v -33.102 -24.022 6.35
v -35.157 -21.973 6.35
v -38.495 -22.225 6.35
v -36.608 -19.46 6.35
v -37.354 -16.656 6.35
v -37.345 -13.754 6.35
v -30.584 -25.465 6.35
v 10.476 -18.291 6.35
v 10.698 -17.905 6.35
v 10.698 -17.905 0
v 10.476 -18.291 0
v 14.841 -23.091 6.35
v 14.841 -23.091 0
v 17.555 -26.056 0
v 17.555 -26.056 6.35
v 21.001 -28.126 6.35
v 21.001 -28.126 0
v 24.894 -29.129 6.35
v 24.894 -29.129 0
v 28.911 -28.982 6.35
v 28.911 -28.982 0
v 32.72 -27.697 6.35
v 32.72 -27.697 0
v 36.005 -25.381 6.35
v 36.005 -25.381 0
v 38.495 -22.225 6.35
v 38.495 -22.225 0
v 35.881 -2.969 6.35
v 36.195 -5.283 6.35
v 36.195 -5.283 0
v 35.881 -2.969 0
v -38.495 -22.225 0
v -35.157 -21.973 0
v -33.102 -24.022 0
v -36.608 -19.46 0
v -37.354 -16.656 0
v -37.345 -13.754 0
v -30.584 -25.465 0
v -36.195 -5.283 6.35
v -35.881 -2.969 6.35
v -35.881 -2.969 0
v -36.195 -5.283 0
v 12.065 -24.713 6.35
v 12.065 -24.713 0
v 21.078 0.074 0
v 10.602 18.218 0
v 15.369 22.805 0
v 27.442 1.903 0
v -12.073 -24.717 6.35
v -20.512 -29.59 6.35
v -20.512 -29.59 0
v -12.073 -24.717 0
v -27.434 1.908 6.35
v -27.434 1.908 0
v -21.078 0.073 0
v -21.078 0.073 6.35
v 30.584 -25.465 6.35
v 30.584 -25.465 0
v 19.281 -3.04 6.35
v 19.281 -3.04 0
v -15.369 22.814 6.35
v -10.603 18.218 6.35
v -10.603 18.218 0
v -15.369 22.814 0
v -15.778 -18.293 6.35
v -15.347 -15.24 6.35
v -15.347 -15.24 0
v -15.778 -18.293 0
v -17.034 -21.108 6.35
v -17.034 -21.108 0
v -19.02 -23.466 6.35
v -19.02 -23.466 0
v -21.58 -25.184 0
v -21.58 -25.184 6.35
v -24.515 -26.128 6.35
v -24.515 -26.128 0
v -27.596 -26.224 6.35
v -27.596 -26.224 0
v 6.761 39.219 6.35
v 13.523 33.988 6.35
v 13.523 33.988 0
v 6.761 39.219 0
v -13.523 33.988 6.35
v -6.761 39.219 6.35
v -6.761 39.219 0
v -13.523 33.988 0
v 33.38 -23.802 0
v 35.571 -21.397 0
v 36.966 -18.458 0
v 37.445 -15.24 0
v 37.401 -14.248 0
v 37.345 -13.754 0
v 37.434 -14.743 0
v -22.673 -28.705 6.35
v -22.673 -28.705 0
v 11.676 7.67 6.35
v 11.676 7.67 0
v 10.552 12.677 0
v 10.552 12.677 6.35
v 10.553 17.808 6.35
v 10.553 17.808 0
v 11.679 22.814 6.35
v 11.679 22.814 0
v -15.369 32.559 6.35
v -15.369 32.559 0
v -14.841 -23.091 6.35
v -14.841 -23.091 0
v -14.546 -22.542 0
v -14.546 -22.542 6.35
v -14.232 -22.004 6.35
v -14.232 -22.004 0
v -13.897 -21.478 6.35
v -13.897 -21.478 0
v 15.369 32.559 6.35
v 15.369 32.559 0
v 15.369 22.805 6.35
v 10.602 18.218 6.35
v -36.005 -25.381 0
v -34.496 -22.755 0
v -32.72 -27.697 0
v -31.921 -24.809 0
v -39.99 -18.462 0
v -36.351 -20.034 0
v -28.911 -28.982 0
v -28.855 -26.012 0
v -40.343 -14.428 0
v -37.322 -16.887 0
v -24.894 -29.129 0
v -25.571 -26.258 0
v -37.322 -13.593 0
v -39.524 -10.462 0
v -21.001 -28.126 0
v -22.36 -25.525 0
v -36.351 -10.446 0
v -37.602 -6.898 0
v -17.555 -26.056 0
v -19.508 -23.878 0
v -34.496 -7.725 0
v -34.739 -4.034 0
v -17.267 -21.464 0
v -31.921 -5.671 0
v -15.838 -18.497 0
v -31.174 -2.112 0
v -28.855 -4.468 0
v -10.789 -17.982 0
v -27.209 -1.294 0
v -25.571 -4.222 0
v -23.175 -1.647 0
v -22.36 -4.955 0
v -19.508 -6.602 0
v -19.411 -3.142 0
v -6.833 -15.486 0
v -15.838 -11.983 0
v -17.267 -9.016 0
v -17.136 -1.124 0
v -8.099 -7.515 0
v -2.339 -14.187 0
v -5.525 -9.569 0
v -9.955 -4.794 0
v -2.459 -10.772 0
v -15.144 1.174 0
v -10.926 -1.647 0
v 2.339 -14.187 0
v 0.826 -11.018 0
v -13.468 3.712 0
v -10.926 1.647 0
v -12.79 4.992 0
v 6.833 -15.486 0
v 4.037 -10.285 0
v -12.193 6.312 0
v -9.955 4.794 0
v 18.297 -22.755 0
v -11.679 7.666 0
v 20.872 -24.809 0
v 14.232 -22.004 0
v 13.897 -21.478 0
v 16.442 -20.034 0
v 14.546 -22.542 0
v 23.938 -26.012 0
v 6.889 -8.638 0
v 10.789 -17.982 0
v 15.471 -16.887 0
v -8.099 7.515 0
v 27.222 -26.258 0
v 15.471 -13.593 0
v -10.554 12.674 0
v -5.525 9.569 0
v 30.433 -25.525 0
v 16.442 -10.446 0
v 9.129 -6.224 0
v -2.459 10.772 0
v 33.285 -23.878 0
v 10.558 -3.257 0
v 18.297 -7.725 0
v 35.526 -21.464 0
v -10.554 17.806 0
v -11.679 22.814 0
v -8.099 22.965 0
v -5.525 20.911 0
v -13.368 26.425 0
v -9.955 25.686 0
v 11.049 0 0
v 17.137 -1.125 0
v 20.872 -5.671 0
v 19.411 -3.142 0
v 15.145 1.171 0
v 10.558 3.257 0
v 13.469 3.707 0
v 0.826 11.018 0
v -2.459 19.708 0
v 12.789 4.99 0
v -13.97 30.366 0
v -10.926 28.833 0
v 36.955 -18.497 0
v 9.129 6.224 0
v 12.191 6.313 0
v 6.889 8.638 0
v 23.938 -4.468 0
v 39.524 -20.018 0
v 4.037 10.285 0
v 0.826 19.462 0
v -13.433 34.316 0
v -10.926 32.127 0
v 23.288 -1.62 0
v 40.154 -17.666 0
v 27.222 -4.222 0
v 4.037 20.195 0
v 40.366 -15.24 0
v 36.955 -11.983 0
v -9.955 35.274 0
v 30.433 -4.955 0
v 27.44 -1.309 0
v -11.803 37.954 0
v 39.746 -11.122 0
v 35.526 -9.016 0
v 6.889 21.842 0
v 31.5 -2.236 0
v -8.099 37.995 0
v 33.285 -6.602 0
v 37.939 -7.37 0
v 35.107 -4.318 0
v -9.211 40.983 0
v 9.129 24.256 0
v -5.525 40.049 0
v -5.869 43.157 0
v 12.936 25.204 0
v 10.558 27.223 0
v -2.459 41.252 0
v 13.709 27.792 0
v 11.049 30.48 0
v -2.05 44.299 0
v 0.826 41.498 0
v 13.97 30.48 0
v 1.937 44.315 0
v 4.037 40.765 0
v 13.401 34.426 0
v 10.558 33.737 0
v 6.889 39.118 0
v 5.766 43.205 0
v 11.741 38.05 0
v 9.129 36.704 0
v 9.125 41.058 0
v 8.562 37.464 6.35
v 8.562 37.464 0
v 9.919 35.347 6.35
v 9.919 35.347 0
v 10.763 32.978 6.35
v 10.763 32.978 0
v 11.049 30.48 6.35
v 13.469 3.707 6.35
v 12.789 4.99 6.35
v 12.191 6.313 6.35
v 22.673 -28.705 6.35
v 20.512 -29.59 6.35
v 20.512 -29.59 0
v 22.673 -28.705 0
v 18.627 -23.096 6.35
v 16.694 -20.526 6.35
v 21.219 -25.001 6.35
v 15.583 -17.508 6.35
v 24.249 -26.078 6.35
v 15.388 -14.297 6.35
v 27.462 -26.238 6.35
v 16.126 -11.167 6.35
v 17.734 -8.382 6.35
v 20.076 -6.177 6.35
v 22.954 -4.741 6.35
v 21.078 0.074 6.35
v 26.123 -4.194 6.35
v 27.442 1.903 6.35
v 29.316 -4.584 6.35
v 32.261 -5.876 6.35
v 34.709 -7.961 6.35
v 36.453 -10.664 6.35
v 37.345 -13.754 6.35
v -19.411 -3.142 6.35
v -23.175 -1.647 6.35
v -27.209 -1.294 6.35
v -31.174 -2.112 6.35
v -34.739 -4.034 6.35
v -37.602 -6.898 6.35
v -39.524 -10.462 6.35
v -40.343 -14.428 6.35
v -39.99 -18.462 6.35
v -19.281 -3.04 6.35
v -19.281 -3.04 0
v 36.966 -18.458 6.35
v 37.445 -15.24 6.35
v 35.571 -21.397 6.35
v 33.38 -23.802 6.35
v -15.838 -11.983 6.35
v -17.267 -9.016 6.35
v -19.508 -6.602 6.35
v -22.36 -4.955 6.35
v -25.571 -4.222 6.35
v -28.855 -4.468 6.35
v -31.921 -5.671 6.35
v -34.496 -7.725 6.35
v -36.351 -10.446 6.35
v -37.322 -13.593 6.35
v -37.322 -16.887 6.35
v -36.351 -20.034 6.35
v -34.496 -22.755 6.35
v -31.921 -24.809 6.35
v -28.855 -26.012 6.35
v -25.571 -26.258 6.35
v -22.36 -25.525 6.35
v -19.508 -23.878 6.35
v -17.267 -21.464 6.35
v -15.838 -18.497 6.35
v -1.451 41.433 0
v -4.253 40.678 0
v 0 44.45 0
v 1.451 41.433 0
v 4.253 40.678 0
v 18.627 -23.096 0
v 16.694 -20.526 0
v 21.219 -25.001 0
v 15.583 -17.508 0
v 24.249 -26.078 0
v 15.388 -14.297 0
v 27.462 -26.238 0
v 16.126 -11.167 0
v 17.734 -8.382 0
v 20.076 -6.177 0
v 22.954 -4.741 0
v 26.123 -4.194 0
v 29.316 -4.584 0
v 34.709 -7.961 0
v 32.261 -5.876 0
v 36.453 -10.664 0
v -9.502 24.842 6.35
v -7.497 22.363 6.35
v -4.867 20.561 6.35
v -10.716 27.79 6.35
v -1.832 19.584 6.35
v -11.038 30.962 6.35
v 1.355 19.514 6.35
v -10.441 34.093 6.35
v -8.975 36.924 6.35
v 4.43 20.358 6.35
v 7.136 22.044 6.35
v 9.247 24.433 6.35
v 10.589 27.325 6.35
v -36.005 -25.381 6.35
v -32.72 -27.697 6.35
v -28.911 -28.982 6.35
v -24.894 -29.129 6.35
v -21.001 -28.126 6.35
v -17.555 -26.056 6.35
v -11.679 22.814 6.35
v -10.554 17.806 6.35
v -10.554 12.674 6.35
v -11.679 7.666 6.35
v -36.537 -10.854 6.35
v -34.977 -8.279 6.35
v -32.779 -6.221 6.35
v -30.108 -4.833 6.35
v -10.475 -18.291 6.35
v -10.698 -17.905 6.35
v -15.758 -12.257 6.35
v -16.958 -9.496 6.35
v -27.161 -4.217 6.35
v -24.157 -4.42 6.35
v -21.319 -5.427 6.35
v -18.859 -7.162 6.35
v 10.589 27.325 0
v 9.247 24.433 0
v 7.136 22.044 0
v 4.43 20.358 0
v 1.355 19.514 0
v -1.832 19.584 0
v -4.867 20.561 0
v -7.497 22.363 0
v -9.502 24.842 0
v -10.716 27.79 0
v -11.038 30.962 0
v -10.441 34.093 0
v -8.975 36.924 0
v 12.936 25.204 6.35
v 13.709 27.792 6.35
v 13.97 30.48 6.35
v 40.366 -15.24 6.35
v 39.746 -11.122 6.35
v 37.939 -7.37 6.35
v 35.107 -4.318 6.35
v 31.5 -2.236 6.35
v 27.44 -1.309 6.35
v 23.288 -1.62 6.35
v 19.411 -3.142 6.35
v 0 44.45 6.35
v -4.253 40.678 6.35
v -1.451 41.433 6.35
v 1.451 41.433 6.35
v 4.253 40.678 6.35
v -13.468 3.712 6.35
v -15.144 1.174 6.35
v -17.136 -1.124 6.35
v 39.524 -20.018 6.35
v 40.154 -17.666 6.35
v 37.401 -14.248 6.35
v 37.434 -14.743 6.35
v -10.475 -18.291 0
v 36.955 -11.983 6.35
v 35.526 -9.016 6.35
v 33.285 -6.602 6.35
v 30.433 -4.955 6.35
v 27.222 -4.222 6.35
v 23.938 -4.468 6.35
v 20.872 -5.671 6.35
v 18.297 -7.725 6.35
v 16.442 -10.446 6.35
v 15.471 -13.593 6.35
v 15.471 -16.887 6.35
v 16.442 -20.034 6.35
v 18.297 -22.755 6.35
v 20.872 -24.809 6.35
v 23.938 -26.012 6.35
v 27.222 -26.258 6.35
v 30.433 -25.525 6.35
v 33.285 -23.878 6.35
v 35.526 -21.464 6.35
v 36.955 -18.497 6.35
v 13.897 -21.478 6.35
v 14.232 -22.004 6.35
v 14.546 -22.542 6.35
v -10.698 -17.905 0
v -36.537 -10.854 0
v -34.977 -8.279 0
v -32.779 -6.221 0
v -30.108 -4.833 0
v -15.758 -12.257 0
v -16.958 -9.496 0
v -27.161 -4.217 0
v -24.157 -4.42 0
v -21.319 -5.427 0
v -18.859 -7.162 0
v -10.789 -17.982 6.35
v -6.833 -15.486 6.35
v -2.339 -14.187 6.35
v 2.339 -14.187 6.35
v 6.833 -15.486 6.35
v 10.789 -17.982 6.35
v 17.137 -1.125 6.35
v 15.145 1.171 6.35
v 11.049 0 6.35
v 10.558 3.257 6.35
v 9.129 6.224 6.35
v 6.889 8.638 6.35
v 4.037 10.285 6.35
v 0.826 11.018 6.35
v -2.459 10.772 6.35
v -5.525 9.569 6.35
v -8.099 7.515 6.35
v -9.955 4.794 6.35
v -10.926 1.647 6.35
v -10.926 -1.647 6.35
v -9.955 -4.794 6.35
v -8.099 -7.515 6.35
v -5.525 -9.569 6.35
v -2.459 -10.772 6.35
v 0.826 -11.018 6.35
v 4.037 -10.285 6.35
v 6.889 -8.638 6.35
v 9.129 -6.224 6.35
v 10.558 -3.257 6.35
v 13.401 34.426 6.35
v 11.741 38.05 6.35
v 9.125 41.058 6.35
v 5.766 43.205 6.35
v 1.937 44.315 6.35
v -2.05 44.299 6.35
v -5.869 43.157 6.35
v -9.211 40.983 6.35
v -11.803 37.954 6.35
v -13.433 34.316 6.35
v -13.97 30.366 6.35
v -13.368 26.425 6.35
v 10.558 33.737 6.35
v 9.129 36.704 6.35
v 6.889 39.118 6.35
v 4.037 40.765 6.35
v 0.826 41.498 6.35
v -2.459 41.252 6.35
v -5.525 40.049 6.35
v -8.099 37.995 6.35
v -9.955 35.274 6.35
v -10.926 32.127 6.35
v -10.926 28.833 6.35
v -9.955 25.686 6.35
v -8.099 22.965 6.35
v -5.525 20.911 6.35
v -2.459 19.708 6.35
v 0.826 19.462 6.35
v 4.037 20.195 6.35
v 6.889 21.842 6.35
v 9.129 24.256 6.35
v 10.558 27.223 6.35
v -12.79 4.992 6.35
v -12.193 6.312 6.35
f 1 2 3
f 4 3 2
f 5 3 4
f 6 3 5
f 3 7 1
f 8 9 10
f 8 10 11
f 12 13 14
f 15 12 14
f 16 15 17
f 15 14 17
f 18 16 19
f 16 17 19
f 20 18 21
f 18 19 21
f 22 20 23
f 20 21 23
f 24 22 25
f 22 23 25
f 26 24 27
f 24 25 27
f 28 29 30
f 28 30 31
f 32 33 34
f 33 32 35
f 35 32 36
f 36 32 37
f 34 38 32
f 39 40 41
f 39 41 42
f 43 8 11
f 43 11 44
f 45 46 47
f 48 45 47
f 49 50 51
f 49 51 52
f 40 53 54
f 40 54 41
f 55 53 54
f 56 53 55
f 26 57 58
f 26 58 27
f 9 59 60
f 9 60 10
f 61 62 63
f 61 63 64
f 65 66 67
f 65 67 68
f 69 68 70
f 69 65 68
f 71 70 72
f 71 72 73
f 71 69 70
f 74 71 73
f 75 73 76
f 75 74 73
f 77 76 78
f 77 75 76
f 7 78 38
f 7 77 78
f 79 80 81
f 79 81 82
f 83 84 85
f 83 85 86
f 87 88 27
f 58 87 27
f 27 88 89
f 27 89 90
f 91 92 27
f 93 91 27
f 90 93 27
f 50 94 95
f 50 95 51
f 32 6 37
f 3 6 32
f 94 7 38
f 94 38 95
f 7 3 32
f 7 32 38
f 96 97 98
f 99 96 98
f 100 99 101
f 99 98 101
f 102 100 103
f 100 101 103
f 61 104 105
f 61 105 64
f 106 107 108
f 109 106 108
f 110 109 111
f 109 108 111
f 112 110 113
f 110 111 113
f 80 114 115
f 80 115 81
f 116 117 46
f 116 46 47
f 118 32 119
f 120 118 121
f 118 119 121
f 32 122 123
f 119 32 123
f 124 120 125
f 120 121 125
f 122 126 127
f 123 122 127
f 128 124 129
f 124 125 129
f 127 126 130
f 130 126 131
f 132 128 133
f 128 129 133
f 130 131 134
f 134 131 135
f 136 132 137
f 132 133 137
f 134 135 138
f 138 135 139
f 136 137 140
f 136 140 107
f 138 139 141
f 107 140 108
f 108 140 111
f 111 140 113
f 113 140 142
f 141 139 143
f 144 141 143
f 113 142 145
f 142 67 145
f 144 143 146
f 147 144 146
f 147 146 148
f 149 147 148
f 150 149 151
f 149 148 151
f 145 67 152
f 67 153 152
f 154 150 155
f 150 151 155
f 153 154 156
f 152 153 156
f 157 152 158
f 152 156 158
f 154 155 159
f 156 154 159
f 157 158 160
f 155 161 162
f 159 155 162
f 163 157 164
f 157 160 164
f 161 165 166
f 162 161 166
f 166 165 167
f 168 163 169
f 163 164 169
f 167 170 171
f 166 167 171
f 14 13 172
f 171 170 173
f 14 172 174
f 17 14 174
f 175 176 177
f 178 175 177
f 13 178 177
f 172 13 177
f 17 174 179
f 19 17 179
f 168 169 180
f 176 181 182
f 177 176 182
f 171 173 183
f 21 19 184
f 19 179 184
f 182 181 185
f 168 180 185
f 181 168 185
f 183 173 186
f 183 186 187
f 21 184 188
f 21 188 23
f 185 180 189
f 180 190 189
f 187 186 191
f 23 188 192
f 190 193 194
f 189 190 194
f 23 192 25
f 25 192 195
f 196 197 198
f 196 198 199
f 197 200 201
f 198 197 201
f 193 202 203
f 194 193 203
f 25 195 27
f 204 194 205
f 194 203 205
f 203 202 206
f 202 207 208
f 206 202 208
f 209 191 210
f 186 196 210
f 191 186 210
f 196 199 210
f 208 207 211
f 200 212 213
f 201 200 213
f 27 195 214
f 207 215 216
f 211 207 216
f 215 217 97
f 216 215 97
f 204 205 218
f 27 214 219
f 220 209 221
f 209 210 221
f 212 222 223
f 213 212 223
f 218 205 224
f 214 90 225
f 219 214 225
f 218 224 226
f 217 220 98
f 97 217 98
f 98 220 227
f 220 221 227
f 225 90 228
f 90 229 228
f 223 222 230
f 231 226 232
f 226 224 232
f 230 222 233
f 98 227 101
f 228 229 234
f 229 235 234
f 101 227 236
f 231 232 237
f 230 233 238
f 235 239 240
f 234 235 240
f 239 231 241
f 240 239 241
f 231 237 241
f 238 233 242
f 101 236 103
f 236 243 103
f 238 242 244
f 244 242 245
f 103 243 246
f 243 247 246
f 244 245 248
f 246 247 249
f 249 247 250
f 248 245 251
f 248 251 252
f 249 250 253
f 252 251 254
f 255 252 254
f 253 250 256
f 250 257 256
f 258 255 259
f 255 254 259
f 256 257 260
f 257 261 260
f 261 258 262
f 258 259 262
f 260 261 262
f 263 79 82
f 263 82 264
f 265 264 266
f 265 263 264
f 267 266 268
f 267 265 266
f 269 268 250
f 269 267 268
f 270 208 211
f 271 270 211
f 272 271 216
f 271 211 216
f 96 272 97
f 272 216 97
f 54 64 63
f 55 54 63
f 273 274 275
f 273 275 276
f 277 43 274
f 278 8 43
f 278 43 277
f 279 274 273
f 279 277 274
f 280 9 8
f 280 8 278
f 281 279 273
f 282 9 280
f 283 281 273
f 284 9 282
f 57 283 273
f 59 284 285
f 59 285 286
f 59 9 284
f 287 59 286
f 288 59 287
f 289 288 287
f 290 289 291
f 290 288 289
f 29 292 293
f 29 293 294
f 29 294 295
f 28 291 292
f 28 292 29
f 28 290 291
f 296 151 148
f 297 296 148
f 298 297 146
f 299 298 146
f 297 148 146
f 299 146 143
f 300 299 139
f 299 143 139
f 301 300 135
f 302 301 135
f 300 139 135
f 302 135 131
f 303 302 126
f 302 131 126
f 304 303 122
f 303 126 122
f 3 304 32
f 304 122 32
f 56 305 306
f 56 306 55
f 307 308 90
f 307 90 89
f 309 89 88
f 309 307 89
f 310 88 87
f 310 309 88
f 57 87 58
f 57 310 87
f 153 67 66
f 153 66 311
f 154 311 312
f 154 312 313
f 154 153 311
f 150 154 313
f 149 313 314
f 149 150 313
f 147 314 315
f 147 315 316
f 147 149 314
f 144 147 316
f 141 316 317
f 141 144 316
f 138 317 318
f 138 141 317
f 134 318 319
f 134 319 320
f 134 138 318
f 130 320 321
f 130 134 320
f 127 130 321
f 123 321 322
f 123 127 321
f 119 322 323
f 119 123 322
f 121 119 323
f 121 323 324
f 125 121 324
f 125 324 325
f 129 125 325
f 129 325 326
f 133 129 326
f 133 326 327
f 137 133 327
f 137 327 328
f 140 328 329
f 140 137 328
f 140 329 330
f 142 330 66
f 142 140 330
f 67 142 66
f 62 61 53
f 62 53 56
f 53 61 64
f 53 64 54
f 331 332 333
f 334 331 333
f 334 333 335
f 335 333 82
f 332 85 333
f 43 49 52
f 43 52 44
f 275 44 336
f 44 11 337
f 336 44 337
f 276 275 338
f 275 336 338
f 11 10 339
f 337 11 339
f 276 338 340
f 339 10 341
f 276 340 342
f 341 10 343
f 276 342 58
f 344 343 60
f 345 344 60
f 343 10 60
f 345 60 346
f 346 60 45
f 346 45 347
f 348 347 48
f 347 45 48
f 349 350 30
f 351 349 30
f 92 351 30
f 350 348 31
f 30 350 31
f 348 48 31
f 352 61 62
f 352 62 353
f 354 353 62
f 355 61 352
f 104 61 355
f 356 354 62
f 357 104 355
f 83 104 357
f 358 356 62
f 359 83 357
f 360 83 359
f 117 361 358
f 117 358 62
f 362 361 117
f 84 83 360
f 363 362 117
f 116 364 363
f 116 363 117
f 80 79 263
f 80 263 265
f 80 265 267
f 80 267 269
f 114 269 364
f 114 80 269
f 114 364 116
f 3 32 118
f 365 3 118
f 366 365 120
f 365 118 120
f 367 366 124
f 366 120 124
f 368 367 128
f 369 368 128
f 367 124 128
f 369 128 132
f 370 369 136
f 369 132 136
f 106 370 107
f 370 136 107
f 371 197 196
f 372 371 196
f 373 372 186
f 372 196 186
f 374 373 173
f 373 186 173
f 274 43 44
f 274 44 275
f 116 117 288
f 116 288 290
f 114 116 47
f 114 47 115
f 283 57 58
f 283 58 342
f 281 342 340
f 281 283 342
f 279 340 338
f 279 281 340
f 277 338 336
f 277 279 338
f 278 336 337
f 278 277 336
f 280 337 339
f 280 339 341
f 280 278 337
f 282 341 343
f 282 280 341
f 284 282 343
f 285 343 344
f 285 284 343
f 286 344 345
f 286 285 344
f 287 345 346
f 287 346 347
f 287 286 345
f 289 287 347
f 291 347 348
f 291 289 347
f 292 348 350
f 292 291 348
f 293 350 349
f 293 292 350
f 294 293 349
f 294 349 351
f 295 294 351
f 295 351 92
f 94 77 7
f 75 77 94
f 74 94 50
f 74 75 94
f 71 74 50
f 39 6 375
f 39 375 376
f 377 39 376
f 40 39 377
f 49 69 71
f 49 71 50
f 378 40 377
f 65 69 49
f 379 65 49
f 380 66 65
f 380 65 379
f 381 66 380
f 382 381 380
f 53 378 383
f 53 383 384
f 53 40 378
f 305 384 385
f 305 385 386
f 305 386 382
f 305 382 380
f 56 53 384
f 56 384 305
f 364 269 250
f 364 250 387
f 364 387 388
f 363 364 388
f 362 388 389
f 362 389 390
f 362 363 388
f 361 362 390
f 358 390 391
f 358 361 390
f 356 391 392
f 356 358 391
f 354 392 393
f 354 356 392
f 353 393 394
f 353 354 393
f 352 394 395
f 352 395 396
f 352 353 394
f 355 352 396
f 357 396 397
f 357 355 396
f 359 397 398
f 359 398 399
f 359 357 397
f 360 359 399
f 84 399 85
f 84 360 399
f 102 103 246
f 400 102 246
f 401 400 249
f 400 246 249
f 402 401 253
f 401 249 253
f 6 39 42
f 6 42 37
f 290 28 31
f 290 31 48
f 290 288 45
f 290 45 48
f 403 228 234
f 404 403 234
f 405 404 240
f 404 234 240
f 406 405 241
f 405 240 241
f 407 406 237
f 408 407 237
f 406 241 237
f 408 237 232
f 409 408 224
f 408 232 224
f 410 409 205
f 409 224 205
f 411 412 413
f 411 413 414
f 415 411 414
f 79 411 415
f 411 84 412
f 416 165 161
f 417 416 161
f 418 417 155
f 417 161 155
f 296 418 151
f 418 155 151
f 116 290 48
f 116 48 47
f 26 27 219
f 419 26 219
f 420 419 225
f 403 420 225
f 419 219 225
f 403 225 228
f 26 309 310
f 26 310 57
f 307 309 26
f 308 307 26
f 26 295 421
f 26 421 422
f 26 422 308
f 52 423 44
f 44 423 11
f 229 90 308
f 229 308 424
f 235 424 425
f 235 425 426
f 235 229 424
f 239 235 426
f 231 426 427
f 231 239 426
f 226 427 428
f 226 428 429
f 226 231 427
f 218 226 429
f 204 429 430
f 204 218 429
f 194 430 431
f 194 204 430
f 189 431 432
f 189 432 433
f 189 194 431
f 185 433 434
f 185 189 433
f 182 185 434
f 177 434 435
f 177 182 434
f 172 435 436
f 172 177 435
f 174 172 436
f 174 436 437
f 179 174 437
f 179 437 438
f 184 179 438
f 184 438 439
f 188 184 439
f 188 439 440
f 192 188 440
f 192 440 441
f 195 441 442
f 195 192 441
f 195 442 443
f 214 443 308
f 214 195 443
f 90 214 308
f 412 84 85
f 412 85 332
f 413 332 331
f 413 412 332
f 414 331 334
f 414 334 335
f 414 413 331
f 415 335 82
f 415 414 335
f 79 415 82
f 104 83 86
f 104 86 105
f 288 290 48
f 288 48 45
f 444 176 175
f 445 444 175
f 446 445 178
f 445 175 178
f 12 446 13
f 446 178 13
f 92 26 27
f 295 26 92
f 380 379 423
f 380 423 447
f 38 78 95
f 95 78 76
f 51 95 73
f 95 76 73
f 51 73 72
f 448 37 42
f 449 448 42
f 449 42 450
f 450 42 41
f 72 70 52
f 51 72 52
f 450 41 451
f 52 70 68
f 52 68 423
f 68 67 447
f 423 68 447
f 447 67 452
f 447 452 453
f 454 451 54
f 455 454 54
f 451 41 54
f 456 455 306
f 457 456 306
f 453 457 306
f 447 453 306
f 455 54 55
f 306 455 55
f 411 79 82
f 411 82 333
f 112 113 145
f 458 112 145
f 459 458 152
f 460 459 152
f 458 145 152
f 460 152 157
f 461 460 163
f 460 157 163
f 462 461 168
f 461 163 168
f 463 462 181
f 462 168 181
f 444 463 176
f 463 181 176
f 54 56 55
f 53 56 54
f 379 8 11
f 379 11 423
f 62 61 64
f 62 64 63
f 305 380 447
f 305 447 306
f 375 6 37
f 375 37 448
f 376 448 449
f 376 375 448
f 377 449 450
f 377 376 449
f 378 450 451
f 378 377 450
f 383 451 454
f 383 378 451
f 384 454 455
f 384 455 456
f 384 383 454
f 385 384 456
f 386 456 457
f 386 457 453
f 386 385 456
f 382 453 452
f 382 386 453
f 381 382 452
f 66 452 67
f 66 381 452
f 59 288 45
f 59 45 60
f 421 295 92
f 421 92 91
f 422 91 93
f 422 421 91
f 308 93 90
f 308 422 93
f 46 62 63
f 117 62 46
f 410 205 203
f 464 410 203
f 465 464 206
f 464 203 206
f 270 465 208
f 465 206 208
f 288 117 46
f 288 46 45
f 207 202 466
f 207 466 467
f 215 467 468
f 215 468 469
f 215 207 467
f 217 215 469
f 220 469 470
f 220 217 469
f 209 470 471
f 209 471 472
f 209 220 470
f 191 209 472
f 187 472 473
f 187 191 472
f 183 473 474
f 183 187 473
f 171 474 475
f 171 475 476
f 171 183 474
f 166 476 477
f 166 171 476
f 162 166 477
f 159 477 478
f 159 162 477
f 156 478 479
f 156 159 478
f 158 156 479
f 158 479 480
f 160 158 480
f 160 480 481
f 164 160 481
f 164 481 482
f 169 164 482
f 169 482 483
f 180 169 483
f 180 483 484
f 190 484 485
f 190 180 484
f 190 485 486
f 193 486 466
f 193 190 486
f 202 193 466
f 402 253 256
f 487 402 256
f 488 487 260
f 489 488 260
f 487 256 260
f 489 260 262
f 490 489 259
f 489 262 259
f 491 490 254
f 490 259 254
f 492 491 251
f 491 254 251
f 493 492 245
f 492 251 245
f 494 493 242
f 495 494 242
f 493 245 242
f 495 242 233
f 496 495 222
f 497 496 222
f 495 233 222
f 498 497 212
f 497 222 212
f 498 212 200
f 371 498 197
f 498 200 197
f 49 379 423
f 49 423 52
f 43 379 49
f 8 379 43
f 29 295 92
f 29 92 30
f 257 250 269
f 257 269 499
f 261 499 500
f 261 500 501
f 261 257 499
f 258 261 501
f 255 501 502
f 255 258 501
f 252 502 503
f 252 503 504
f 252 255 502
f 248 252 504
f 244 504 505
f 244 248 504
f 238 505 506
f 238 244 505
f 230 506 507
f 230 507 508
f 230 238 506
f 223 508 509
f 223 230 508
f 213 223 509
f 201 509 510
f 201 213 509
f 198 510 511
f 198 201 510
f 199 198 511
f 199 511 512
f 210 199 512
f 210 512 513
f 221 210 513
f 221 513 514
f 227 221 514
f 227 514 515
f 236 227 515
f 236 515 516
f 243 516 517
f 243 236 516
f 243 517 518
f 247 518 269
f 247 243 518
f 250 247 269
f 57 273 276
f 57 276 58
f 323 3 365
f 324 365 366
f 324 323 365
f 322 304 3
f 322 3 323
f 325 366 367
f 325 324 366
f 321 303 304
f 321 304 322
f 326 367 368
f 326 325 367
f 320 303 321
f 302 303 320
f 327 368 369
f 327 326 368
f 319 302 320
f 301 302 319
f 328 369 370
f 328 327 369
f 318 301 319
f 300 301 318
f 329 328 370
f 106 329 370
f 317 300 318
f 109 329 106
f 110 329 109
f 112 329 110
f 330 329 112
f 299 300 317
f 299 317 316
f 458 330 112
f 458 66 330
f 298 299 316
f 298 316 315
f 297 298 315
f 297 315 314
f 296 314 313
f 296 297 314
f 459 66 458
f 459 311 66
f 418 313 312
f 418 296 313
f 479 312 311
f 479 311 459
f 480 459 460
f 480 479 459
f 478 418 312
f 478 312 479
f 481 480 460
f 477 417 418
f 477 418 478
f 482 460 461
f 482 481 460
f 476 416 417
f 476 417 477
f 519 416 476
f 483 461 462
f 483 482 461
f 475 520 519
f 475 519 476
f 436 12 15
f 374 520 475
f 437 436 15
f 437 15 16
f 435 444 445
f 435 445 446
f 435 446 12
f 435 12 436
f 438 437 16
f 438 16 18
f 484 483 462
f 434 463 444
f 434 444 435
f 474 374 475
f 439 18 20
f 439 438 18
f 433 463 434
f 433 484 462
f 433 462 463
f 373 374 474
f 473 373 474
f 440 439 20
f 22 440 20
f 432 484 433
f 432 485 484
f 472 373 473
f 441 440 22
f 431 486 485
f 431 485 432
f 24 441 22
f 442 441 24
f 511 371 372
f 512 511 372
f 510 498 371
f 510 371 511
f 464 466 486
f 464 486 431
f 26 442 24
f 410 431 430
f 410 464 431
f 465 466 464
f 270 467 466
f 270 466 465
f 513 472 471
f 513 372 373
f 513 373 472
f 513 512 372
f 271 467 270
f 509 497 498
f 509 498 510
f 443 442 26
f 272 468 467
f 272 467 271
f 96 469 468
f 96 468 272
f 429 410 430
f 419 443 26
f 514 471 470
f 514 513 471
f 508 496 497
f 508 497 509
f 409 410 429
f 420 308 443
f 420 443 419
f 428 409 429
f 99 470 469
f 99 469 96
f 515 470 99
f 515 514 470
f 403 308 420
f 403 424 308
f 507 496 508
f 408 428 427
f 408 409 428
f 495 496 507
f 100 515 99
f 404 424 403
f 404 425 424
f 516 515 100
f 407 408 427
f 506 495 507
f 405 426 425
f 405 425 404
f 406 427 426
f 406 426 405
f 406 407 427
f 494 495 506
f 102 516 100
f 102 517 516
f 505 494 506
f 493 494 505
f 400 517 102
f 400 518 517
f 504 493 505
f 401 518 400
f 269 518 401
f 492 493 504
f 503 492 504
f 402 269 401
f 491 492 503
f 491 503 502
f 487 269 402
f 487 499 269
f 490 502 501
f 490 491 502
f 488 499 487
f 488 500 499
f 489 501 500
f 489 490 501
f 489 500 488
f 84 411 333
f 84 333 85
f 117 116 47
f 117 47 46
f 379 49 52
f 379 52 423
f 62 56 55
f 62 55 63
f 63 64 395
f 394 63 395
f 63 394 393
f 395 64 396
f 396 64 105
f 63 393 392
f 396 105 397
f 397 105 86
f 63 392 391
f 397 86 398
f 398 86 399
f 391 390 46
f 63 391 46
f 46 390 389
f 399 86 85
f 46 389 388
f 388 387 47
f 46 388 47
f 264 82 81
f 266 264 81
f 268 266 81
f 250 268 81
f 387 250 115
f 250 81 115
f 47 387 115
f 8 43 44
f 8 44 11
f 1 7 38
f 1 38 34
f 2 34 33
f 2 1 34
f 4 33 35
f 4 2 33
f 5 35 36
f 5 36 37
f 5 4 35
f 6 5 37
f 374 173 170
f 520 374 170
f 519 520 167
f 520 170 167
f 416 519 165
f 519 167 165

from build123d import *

# Parameters (mm, degrees)
F0_R     = 11.049
F1_DEPTH = 6.35
F3_DEPTH = 6.35
F4_DEPTH = 6.35


with BuildPart() as f1:
    # F0 (on Top) → F1 (new body)
    with BuildSketch(Plane.XY):
        with BuildLine():
            ThreePointArc((13.97, 30.48), (9.8782817686, 40.3582816978), (1.001e-07, 44.45))
            ThreePointArc((1.001e-07, 44.45), (-12.2933631254, 37.1158212051), (-11.6788202328, 22.8140977067))
            ThreePointArc((-11.6788202328, 22.8140977067), (0, 16.51), (11.6788202328, 22.8140977067))
            ThreePointArc((11.6788202328, 22.8140977067), (13.3849545881, 26.4795136953), (13.97, 30.48))
        make_face()
        with Locations((0, 30.48)):
            Circle(F0_R, mode=Mode.SUBTRACT)
        with BuildLine():
            ThreePointArc((14.8410698741, -23.0907318513), (26.9074165938, -29.2006524755), (38.4948290898, -22.2250001877))
            ThreePointArc((38.4948290898, -22.2250001877), (39.8904380726, -18.8557021648), (40.3664543073, -15.24))
            ThreePointArc((40.3664543073, -15.24), (33.3814543073, -3.1416251091), (19.4114543073, -3.1416251091))
            ThreePointArc((19.4114543073, -3.1416251091), (13.0183619509, -11.2166251849), (13.8967636747, -21.4784801105))
            ThreePointArc((13.8967636747, -21.4784801105), (14.3915116715, -22.2713720046), (14.8410698741, -23.0907318513))
        make_face()
        with Locations((26.3964543073, -15.24)):
            Circle(F0_R, mode=Mode.SUBTRACT)
        with BuildLine():
            ThreePointArc((-19.4114543073, -3.1416251091), (-36.2747358553, -5.3617180816), (-38.4948294602, -22.2249995463))
            ThreePointArc((-38.4948294602, -22.2249995463), (-26.9074169639, -29.200652462), (-14.8410698741, -23.0907318513))
            ThreePointArc((-14.8410698741, -23.0907318513), (-14.3915116715, -22.2713720046), (-13.8967636747, -21.4784801105))
            ThreePointArc((-13.8967636747, -21.4784801105), (-12.798999065, -18.4447013794), (-12.4264543073, -15.24))
            ThreePointArc((-12.4264543073, -15.24), (-14.2980794165, -8.255), (-19.4114543073, -3.1416251091))
        make_face()
        with Locations((-26.3964543073, -15.24)):
            Circle(F0_R, mode=Mode.SUBTRACT)
        with BuildLine():
            ThreePointArc((11.6760400094, 7.6701362242), (-0.0025325784, 13.9699997704), (-11.6788202328, 7.6659022933))
            ThreePointArc((-11.6788202328, 7.6659022933), (-12.4809842339, 5.6469568625), (-13.4679192952, 3.7116101437))
            ThreePointArc((-13.4679192952, 3.7116101437), (-1.8727075915, -13.8439108014), (13.97, 0))
            ThreePointArc((13.97, 0), (13.8442041147, 1.8705380059), (13.4690819712, 3.707388684))
            ThreePointArc((13.4690819712, 3.707388684), (12.4797561144, 5.6467706201), (11.6760400094, 7.6701362242))
        make_face()
        Circle(F0_R, mode=Mode.SUBTRACT)
        with BuildLine():
            ThreePointArc((-13.4679192952, 3.7116101437), (-16.1025247385, -0.007414565), (-19.4114543073, -3.1416251091))
            ThreePointArc((-19.4114543073, -3.1416251091), (-14.2980794165, -8.255), (-12.4264543073, -15.24))
            ThreePointArc((-12.4264543073, -15.24), (-12.798999065, -18.4447013794), (-13.8967636747, -21.4784801105))
            ThreePointArc((-13.8967636747, -21.4784801105), (0, -14.0222325382), (13.8967636747, -21.4784801105))
            ThreePointArc((13.8967636747, -21.4784801105), (13.0183619509, -11.2166251849), (19.4114543073, -3.1416251091))
            ThreePointArc((19.4114543073, -3.1416251091), (16.1033825855, -0.009408381), (13.4690819712, 3.707388684))
            ThreePointArc((13.4690819712, 3.707388684), (13.8442041147, 1.8705380059), (13.97, 0))
            ThreePointArc((13.97, 0), (-1.8727075915, -13.8439108014), (-13.4679192952, 3.7116101437))
        make_face()
        with BuildLine():
            ThreePointArc((11.6788202328, 22.8140977067), (0, 16.51), (-11.6788202328, 22.8140977067))
            ThreePointArc((-11.6788202328, 22.8140977067), (-10.4117903254, 15.24), (-11.6788202328, 7.6659022933))
            ThreePointArc((-11.6788202328, 7.6659022933), (-0.0025325784, 13.9699997704), (11.6760400094, 7.6701362242))
            ThreePointArc((11.6760400094, 7.6701362242), (10.4108136569, 15.2423494989), (11.6788202328, 22.8140977067))
        make_face()
    extrude(amount=F1_DEPTH)


with BuildPart() as f3:
    # F2 (on face) → F3 (new body)
    with BuildSketch(Plane.XY.offset(6.35)):
        with BuildLine():
            Line((6.7612554594, 39.2187542369), (0, 44.45))
            Line((0, 44.45), (-6.7612550835, 39.2187545278))
            ThreePointArc((-6.7612550835, 39.2187545278), (2.377e-07, 41.529), (6.7612554594, 39.2187542369))
        make_face()
    extrude(amount=-F3_DEPTH)


with BuildPart() as f3b:
    # F2 (on face) → F3, piece 2 (new body)
    with BuildSketch(Plane.XY.offset(6.35)):
        with BuildLine():
            ThreePointArc((-30.5838103752, -25.4647958494), (-35.9651691067, -20.7644998045), (-37.3450652346, -13.7539583573))
            Line((-37.3450652346, -13.7539583573), (-38.4948291982, -22.225))
            Line((-38.4948291982, -22.225), (-30.5838103752, -25.4647958494))
        make_face()
    extrude(amount=-F3_DEPTH)


with BuildPart() as f3c:
    # F2 (on face) → F3, piece 3 (new body)
    with BuildSketch(Plane.XY.offset(6.35)):
        with BuildLine():
            Line((38.4948291982, -22.225), (37.3450652986, -13.7539588286))
            ThreePointArc((37.3450652986, -13.7539588286), (37.4203284866, -14.4952859079), (37.4454543073, -15.24))
            ThreePointArc((37.4454543073, -15.24), (35.5710523843, -21.3968783588), (30.5838105159, -25.4647957917))
            Line((30.5838105159, -25.4647957917), (38.4948291982, -22.225))
        make_face()
    extrude(amount=-F3_DEPTH)


with BuildPart() as f3d:
    # F2 (on face) → F3, piece 4 (new body)
    with BuildSketch(Plane.XY.offset(6.35)):
        with BuildLine():
            ThreePointArc((-11.6788202328, 22.8140977067), (-13.7836150335, 28.2056085193), (-13.5225101212, 33.9875090909))
            Line((-13.5225101212, 33.9875090909), (-15.3694075638, 32.5585474906))
            Line((-15.3694075638, 32.5585474906), (-15.3694075638, 22.8140977067))
            Line((-15.3694075638, 22.8140977067), (-10.6030594219, 18.2175487878))
            ThreePointArc((-10.6030594219, 18.2175487878), (-11.0240859252, 20.5431713405), (-11.6788202328, 22.8140977067))
        make_face()
        with BuildLine():
            Line((15.3694075638, 32.5585474906), (13.5225101212, 33.9875090909))
            ThreePointArc((13.5225101212, 33.9875090909), (13.7836150335, 28.2056085193), (11.6788202328, 22.8140977067))
            ThreePointArc((11.6788202328, 22.8140977067), (11.023712607, 20.5431960994), (10.6023758131, 18.2175487878))
            Line((10.6023758131, 18.2175487878), (15.3694075638, 22.8049474906))
            Line((15.3694075638, 22.8049474906), (15.3694075638, 32.5585474906))
        make_face()
        with BuildLine():
            ThreePointArc((11.049, 30.48), (-4.8669956638, 20.5606878158), (-6.7612550835, 39.2187545278))
            Line((-6.7612550835, 39.2187545278), (-13.5225101212, 33.9875090909))
            ThreePointArc((-13.5225101212, 33.9875090909), (-13.7836150335, 28.2056085193), (-11.6788202328, 22.8140977067))
            ThreePointArc((-11.6788202328, 22.8140977067), (-11.0240859252, 20.5431713405), (-10.6030594219, 18.2175487878))
            Line((-10.6030594219, 18.2175487878), (10.6023758131, 18.2175487878))
            ThreePointArc((10.6023758131, 18.2175487878), (11.023712607, 20.5431960994), (11.6788202328, 22.8140977067))
            ThreePointArc((11.6788202328, 22.8140977067), (13.7836150335, 28.2056085193), (13.5225101212, 33.9875090909))
            Line((13.5225101212, 33.9875090909), (6.7612554594, 39.2187542369))
            ThreePointArc((6.7612554594, 39.2187542369), (9.9193122889, 35.3469954504), (11.049, 30.48))
        make_face()
    extrude(amount=-F3_DEPTH)


with BuildPart() as f3e:
    # F2 (on face) → F3, piece 5 (new body)
    with BuildSketch(Plane.XY.offset(6.35)):
        with BuildLine():
            Line((-10.475330334, -18.2912932111), (-10.6981363772, -17.9053818241))
            ThreePointArc((-10.6981363772, -17.9053818241), (-13.0301468799, -20.2898904764), (-14.8410698741, -23.0907318513))
            ThreePointArc((-14.8410698741, -23.0907318513), (-18.2575858828, -26.5942820455), (-22.6727912235, -28.7045918333))
            Line((-22.6727912235, -28.7045918333), (-20.5118254553, -29.5895711366))
            Line((-20.5118254553, -29.5895711366), (-12.0728843965, -24.7173462447))
            Line((-12.0728843965, -24.7173462447), (-10.475330334, -18.2912932111))
        make_face()
        with BuildLine():
            Line((-21.0780479515, 0.0731524007), (-27.4343676407, 1.9078236461))
            Line((-27.4343676407, 1.9078236461), (-35.881233019, -2.9689763539))
            Line((-35.881233019, -2.9689763539), (-36.1953013447, -5.2829172576))
            ThreePointArc((-36.1953013447, -5.2829172576), (-28.1644239914, -1.3823240334), (-19.4114543073, -3.1416251091))
            ThreePointArc((-19.4114543073, -3.1416251091), (-19.3461039055, -3.090697795), (-19.2809352253, -3.0395381481))
            Line((-19.2809352253, -3.0395381481), (-21.0780479515, 0.0731524007))
        make_face()
        with BuildLine():
            Line((-10.6981363772, -17.9053818241), (-19.2809352253, -3.0395381481))
            ThreePointArc((-19.2809352253, -3.0395381481), (-19.3461039055, -3.090697795), (-19.4114543073, -3.1416251091))
            ThreePointArc((-19.4114543073, -3.1416251091), (-28.1644239914, -1.3823240334), (-36.1953013447, -5.2829172576))
            Line((-36.1953013447, -5.2829172576), (-37.3450652346, -13.7539583573))
            ThreePointArc((-37.3450652346, -13.7539583573), (-25.6517399779, -4.2161258367), (-15.3474543073, -15.24))
            ThreePointArc((-15.3474543073, -15.24), (-20.2395758854, -24.4145980346), (-30.5838103752, -25.4647958494))
            Line((-30.5838103752, -25.4647958494), (-22.6727912235, -28.7045918333))
            ThreePointArc((-22.6727912235, -28.7045918333), (-18.2575858828, -26.5942820455), (-14.8410698741, -23.0907318513))
            ThreePointArc((-14.8410698741, -23.0907318513), (-13.0301468799, -20.2898904764), (-10.6981363772, -17.9053818241))
        make_face()
    extrude(amount=-F3_DEPTH)


with BuildPart() as f3f:
    # F2 (on face) → F3, piece 6 (new body)
    with BuildSketch(Plane.XY.offset(6.35)):
        with BuildLine():
            Line((35.881233019, -2.9689763539), (27.4422919603, 1.903248538))
            Line((27.4422919603, 1.903248538), (21.0783897559, 0.0737444233))
            Line((21.0783897559, 0.0737444233), (19.2809212028, -3.0395624358))
            ThreePointArc((19.2809212028, -3.0395624358), (19.3460968966, -3.0907099759), (19.4114543073, -3.1416251091))
            ThreePointArc((19.4114543073, -3.1416251091), (28.1644239914, -1.3823240334), (36.1953013447, -5.2829172576))
            Line((36.1953013447, -5.2829172576), (35.881233019, -2.9689763539))
        make_face()
        with BuildLine():
            ThreePointArc((14.8410698741, -23.0907318513), (13.0301468799, -20.2898904764), (10.6981363772, -17.9053818241))
            Line((10.6981363772, -17.9053818241), (10.4756721384, -18.2907011885))
            Line((10.4756721384, -18.2907011885), (12.0649600769, -24.7127711366))
            Line((12.0649600769, -24.7127711366), (20.5118254553, -29.5895711366))
            Line((20.5118254553, -29.5895711366), (22.6727912235, -28.7045918333))
            ThreePointArc((22.6727912235, -28.7045918333), (18.2575858828, -26.5942820455), (14.8410698741, -23.0907318513))
        make_face()
        with BuildLine():
            ThreePointArc((19.4114543073, -3.1416251091), (19.3460968966, -3.0907099759), (19.2809212028, -3.0395624358))
            Line((19.2809212028, -3.0395624358), (10.6981363772, -17.9053818241))
            ThreePointArc((10.6981363772, -17.9053818241), (13.0301468799, -20.2898904764), (14.8410698741, -23.0907318513))
            ThreePointArc((14.8410698741, -23.0907318513), (18.2575858828, -26.5942820455), (22.6727912235, -28.7045918333))
            Line((22.6727912235, -28.7045918333), (30.5838105159, -25.4647957917))
            ThreePointArc((30.5838105159, -25.4647957917), (16.8277395889, -9.7155000554), (37.3450652986, -13.7539588286))
            Line((37.3450652986, -13.7539588286), (36.1953013447, -5.2829172576))
            ThreePointArc((36.1953013447, -5.2829172576), (28.1644239914, -1.3823240334), (19.4114543073, -3.1416251091))
        make_face()
    extrude(amount=-F3_DEPTH)


with BuildPart() as f4:
    # F2 (on face) → F4 (new body)
    with BuildSketch(Plane.XY.offset(6.35)):
        Polygon((-10.6030594219, 18.2175487878), (-15.3694075638, 22.8140977067), (-27.4343676407, 1.9078236461), (-21.0780479515, 0.0731524007), align=None)
    extrude(amount=-F4_DEPTH)


with BuildPart() as f4b:
    # F2 (on face) → F4, piece 2 (new body)
    with BuildSketch(Plane.XY.offset(6.35)):
        Polygon((27.4422919603, 1.903248538), (15.3694075638, 22.8049474906), (10.6023758131, 18.2175487878), (21.0783897559, 0.0737444233), align=None)
    extrude(amount=-F4_DEPTH)


with BuildPart() as f4c:
    # F2 (on face) → F4, piece 3 (new body)
    with BuildSketch(Plane.XY.offset(6.35)):
        Polygon((12.0649600769, -24.7127711366), (10.4756721384, -18.2907011885), (-10.475330334, -18.2912932111), (-12.0728843965, -24.7173462447), align=None)
    extrude(amount=-F4_DEPTH)


solid = Compound([f1.part, f3.part, f3b.part, f3c.part, f3d.part, f3e.part, f3f.part, f4.part, f4b.part, f4c.part])
